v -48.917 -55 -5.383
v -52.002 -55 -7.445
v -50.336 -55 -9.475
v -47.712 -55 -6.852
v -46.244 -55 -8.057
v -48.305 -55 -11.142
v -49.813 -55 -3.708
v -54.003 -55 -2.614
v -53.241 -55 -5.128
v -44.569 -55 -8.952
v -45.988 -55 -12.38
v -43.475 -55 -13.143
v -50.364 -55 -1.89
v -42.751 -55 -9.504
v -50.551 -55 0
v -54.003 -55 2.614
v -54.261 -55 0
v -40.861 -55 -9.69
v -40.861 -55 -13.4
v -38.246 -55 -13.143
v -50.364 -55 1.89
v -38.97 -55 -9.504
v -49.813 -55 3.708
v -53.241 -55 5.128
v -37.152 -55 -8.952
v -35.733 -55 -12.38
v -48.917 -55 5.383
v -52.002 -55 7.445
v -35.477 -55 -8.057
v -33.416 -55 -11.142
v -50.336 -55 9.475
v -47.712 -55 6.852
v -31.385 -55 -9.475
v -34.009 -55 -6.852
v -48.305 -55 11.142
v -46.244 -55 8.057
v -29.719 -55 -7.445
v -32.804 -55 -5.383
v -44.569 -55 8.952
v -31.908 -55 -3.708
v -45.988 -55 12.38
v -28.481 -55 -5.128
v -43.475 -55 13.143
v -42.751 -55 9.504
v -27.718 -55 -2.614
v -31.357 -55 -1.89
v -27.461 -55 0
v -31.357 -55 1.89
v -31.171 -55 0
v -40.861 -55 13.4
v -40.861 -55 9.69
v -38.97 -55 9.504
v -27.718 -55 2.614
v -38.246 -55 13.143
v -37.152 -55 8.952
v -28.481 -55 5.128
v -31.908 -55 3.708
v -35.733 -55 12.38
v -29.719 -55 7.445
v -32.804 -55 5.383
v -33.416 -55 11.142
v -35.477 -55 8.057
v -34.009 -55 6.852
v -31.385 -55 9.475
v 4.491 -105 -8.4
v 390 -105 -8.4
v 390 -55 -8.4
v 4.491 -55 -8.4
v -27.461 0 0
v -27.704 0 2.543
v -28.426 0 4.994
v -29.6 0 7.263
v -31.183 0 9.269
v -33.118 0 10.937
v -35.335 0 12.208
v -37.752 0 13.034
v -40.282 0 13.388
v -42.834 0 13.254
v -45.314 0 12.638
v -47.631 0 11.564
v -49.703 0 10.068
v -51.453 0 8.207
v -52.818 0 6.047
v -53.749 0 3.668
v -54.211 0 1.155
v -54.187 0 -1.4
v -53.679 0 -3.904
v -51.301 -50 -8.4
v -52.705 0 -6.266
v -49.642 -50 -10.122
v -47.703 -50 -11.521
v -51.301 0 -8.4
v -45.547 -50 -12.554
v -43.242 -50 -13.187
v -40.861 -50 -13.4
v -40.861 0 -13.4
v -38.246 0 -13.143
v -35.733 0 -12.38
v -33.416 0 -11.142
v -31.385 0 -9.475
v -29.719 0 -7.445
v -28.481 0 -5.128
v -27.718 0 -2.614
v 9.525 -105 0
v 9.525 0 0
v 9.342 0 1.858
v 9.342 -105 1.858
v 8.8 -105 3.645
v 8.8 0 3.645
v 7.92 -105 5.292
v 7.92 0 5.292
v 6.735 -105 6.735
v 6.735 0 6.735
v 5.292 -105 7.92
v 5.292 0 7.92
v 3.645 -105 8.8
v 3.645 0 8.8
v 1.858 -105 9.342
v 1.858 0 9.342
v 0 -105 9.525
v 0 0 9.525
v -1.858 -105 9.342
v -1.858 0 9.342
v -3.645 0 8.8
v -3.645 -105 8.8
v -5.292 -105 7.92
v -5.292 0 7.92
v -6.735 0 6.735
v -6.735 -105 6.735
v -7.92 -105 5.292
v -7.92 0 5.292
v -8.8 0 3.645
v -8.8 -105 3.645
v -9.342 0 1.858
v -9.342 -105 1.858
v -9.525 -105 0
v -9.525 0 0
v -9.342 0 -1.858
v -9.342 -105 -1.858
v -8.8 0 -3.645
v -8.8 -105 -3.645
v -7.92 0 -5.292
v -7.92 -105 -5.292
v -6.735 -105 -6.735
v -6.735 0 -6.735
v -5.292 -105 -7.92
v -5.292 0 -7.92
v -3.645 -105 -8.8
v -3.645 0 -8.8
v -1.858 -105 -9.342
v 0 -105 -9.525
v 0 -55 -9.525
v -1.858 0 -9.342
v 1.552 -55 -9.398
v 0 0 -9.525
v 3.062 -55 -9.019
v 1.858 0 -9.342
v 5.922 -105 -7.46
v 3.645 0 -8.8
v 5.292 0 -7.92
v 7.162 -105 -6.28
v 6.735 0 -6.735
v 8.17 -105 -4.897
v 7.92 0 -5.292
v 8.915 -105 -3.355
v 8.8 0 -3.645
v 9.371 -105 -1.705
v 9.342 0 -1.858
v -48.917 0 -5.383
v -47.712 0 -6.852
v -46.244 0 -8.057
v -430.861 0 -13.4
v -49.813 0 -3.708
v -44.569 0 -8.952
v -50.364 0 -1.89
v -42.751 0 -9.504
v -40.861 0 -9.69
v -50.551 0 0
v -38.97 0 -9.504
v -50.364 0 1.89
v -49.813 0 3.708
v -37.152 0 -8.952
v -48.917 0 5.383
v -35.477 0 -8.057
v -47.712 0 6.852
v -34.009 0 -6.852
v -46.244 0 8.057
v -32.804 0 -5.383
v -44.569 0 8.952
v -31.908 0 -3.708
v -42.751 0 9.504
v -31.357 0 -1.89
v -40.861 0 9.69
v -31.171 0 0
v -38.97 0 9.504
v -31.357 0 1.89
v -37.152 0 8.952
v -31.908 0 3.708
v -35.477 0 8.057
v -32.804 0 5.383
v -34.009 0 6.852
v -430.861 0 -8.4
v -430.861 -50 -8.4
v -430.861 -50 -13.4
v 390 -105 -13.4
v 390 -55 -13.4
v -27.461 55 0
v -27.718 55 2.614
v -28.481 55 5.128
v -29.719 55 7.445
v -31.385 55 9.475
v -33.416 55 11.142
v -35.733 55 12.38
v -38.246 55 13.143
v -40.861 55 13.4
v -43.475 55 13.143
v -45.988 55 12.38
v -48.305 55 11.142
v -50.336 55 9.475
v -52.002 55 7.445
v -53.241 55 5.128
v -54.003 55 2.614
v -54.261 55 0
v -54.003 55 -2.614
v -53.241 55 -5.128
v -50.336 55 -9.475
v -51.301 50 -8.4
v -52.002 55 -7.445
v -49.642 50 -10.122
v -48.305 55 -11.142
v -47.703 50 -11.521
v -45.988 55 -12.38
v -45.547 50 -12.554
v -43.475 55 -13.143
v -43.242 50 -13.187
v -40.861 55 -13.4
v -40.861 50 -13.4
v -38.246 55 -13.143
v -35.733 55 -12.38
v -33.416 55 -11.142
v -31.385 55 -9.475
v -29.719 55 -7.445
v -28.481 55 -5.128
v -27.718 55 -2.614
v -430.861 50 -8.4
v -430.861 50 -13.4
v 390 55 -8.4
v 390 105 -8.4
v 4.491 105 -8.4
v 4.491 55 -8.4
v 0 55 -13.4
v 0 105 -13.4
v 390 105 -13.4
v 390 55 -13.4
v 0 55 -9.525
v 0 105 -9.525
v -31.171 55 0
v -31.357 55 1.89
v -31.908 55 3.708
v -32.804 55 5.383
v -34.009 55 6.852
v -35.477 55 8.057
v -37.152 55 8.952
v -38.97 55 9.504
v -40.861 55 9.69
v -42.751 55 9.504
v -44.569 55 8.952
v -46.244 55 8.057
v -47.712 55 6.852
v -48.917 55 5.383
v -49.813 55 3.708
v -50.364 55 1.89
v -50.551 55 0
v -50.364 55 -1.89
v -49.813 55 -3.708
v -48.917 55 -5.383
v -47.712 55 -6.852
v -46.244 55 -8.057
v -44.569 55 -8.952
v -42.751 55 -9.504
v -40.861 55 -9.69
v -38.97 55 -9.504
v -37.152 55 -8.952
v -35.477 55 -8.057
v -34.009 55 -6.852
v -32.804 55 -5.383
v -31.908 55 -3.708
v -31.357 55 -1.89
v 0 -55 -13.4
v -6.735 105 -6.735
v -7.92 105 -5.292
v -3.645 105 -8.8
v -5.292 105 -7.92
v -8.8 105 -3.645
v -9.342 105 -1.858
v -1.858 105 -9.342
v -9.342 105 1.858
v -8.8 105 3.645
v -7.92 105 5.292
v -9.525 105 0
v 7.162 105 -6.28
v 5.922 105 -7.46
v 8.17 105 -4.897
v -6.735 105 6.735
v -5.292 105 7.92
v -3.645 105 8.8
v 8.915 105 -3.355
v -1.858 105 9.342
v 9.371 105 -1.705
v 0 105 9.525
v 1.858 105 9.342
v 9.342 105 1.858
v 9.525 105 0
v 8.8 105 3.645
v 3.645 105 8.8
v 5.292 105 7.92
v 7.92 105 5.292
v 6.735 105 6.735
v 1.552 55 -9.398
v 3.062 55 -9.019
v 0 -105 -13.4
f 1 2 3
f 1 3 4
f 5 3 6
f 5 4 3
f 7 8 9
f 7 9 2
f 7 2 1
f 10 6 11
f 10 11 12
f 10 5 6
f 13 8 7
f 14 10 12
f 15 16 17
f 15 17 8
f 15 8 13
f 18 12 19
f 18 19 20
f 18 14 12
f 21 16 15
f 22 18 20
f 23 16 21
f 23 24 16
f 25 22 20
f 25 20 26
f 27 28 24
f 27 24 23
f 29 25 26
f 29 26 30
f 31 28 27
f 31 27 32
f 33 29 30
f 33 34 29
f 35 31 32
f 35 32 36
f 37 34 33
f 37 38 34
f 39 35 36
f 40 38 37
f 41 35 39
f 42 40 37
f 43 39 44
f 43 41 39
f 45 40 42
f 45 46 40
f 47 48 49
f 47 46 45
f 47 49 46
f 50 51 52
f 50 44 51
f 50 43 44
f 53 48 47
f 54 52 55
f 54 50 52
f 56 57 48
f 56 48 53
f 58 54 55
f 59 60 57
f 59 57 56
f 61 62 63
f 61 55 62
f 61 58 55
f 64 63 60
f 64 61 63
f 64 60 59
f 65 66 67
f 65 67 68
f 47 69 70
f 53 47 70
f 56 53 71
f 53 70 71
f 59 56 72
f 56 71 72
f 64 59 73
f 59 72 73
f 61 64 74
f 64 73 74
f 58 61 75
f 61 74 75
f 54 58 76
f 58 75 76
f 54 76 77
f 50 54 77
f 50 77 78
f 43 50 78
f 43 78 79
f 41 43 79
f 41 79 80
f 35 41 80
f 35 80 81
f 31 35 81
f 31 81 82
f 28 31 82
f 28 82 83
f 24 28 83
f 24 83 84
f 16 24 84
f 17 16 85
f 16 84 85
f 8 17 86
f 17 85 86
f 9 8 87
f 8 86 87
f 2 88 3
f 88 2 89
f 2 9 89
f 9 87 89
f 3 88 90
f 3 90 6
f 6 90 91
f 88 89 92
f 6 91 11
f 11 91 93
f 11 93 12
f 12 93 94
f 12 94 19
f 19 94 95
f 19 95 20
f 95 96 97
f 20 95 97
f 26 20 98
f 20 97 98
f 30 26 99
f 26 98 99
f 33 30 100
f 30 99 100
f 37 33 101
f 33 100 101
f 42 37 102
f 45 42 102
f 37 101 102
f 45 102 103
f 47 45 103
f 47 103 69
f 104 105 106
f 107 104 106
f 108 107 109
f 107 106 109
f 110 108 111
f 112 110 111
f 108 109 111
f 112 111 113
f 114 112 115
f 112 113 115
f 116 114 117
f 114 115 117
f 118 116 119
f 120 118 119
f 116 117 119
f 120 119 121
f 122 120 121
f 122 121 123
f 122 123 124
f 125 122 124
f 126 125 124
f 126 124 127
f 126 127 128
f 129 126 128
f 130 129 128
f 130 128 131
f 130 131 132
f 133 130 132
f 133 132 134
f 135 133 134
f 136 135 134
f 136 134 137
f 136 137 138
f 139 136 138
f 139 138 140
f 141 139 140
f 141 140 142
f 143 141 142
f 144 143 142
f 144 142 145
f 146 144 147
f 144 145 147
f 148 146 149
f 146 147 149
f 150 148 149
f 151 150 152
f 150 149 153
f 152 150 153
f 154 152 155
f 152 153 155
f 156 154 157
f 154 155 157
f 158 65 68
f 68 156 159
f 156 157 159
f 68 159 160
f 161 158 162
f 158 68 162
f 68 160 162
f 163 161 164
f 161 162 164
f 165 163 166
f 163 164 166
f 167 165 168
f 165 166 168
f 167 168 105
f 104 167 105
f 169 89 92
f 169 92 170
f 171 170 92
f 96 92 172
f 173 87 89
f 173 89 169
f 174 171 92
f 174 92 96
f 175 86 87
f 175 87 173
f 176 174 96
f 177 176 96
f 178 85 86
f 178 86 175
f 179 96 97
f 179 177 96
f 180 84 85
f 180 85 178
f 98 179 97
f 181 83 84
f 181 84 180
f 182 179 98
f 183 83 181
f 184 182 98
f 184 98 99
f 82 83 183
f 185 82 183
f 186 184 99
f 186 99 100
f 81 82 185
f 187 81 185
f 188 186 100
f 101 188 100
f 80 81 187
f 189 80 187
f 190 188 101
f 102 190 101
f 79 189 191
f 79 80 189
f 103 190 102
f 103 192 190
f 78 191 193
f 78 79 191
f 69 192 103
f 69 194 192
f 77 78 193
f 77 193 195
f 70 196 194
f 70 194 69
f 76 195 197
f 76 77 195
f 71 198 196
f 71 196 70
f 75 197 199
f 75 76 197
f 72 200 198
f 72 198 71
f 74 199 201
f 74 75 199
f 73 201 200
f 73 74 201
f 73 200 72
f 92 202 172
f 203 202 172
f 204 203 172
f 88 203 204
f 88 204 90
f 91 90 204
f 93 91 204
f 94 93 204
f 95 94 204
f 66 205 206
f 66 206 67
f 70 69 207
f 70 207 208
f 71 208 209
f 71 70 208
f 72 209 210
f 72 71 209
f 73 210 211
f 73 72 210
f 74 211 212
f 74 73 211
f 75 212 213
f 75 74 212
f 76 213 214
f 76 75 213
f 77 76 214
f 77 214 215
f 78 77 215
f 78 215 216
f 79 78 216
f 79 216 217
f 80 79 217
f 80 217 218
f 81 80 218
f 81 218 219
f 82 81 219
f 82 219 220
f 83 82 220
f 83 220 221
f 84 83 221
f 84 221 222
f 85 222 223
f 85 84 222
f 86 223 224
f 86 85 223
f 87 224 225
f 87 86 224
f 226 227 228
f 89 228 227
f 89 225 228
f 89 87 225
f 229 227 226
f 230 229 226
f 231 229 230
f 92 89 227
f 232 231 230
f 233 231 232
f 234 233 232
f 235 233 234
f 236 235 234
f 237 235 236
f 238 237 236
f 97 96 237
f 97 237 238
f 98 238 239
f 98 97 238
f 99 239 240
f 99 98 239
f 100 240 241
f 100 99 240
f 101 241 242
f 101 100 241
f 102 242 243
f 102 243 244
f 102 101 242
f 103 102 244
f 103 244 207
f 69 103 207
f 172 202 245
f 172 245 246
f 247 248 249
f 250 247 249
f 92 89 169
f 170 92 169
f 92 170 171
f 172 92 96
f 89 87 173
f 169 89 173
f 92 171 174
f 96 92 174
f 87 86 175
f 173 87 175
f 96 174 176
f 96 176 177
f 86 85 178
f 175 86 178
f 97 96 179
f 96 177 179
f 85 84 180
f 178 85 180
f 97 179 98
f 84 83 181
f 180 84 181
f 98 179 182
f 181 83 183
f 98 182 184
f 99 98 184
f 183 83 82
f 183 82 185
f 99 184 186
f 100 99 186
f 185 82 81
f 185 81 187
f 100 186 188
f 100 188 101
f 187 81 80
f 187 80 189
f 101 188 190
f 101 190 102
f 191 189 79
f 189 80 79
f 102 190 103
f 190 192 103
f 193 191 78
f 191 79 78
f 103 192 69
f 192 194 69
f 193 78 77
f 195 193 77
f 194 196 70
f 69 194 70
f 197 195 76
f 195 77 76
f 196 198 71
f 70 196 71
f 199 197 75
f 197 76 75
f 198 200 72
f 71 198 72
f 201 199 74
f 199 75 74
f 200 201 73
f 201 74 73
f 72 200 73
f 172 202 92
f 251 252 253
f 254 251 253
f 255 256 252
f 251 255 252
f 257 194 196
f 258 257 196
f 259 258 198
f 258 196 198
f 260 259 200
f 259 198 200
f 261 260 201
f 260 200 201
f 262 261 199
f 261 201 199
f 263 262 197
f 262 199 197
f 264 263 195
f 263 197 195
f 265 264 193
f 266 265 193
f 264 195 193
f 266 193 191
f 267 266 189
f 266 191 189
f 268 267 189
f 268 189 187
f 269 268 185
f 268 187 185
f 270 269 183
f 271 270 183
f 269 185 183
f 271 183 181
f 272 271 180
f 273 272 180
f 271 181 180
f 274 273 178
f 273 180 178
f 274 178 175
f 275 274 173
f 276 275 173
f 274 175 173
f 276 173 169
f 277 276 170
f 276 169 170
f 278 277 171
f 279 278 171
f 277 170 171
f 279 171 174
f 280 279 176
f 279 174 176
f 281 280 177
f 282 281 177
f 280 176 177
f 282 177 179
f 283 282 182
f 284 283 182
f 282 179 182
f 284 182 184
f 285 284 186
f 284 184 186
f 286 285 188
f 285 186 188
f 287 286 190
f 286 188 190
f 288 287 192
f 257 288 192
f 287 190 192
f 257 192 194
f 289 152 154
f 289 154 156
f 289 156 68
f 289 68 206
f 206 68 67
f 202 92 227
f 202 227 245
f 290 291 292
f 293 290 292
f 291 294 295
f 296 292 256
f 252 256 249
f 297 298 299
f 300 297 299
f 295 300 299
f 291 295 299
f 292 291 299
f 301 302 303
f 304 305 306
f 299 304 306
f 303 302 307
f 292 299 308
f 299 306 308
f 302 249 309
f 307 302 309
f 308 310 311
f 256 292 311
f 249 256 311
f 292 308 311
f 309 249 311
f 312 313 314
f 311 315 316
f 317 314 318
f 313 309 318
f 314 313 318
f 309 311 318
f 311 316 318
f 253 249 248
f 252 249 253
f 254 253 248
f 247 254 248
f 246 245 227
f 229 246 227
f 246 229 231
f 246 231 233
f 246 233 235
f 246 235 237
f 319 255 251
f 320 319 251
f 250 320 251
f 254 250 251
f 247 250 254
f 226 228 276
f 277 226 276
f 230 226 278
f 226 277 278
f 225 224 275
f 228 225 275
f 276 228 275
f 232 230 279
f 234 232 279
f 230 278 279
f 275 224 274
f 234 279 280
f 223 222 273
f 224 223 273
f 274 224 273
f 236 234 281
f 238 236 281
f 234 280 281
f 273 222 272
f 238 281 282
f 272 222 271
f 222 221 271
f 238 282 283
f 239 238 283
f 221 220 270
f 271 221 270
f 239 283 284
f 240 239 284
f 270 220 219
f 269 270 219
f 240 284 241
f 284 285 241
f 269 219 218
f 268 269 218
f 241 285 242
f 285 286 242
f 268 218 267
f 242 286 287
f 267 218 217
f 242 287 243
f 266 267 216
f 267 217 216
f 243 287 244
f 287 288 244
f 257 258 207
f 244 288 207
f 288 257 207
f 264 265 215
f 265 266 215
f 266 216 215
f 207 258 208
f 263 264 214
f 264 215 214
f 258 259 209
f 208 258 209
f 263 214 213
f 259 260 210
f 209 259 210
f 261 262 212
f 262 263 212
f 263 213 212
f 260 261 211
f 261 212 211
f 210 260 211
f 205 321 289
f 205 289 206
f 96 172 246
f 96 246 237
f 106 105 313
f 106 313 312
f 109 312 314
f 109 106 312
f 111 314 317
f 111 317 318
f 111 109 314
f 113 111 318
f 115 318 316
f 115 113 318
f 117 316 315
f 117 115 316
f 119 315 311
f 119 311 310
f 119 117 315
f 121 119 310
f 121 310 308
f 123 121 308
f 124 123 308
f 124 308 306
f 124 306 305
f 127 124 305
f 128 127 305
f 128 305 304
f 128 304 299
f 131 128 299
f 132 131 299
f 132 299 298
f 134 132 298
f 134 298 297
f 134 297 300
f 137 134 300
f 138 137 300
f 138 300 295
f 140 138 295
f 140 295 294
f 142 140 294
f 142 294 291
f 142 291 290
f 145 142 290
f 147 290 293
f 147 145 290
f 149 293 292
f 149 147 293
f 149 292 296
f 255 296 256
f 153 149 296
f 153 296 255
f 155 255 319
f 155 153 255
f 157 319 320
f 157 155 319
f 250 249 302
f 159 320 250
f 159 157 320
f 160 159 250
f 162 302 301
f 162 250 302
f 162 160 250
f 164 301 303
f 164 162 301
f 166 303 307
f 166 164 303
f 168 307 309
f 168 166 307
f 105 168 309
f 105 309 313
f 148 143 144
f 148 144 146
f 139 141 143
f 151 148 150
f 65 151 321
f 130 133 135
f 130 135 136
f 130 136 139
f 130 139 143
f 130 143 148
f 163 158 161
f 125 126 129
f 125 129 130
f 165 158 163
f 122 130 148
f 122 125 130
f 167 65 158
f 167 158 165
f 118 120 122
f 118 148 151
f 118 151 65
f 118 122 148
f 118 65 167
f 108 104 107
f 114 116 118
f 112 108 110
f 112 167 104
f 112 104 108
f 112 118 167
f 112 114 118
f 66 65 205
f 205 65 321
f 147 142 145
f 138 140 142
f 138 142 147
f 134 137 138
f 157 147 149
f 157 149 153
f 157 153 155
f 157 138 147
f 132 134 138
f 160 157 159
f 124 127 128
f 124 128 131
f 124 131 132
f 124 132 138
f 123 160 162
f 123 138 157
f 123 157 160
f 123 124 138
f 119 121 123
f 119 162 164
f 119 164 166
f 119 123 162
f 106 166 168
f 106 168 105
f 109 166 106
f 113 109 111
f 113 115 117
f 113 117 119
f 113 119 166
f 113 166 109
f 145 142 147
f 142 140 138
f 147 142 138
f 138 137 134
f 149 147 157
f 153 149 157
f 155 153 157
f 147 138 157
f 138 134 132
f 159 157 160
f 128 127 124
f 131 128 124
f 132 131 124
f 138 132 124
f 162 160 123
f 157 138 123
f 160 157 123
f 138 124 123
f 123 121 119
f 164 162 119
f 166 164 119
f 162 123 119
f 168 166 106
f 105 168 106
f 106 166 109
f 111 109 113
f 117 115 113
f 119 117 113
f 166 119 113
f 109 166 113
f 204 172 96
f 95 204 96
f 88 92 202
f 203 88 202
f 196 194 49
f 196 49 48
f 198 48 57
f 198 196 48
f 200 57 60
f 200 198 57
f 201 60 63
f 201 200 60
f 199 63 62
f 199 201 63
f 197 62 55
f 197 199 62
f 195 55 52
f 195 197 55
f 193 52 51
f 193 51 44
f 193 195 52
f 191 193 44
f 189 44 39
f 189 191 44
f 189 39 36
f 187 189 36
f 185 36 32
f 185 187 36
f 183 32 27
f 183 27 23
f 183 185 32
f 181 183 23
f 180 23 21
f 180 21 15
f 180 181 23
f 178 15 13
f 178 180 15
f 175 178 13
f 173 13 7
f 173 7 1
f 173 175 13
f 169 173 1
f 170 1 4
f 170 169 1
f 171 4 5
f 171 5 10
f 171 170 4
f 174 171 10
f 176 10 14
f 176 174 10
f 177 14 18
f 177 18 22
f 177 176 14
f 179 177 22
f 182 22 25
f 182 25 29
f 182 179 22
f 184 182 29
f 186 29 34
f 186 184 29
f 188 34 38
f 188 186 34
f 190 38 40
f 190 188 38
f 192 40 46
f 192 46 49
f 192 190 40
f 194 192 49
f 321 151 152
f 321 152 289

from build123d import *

# Parameters (mm, degrees)
F0_R     = 9.525
F1_DEPTH = 105
F2_R     = 13.4
F2_R_2   = 9.69
F3_DEPTH = 55
F5_DEPTH = 50
F8_DEPTH = 50


with BuildPart() as f1:
    # F0 (on Front) → F1 (new body)
    with BuildSketch(Plane.XZ):
        Circle(F0_R)
    extrude(amount=F1_DEPTH)

    # F6 (on face) → F8 (join)
    with BuildSketch(Plane.XZ.offset(105)):
        with BuildLine():
            ThreePointArc((4.490615214, -8.4), (2.3146949043, -9.2394703582), (0, -9.525))
            Line((0, -9.525), (0, -13.4))
            Line((0, -13.4), (390, -13.4))
            Line((390, -13.4), (390, -8.4))
            Line((390, -8.4), (4.490615214, -8.4))
        make_face()
    extrude(amount=-F8_DEPTH)


with BuildPart() as f3:
    # F2 (on Front) → F3 (new body)
    with BuildSketch(Plane.XZ):
        with Locations((-40.8605183367, 0)):
            Circle(F2_R)
        with Locations((-40.8605183367, 0)):
            Circle(F2_R_2, mode=Mode.SUBTRACT)
    extrude(amount=F3_DEPTH)

    # F4 (on Front) → F5 (join)
    with BuildSketch(Plane.XZ):
        with BuildLine():
            ThreePointArc((-40.8605183367, -13.4), (-46.6484367881, -12.0855285362), (-51.3008248456, -8.4))
            Line((-51.3008248456, -8.4), (-430.8605183367, -8.4))
            Line((-430.8605183367, -8.4), (-430.8605183367, -13.4))
            Line((-430.8605183367, -13.4), (-40.8605183367, -13.4))
        make_face()
    extrude(amount=F5_DEPTH)


with BuildPart() as f7_1:
    # F7: instance of F3
    add(f3.part.mirror(Plane.XZ))


with BuildPart() as f9_1:
    # F9: instance of F1
    add(f1.part.mirror(Plane.XZ))


solid = Compound([f1.part, f3.part, f7_1.part, f9_1.part])
